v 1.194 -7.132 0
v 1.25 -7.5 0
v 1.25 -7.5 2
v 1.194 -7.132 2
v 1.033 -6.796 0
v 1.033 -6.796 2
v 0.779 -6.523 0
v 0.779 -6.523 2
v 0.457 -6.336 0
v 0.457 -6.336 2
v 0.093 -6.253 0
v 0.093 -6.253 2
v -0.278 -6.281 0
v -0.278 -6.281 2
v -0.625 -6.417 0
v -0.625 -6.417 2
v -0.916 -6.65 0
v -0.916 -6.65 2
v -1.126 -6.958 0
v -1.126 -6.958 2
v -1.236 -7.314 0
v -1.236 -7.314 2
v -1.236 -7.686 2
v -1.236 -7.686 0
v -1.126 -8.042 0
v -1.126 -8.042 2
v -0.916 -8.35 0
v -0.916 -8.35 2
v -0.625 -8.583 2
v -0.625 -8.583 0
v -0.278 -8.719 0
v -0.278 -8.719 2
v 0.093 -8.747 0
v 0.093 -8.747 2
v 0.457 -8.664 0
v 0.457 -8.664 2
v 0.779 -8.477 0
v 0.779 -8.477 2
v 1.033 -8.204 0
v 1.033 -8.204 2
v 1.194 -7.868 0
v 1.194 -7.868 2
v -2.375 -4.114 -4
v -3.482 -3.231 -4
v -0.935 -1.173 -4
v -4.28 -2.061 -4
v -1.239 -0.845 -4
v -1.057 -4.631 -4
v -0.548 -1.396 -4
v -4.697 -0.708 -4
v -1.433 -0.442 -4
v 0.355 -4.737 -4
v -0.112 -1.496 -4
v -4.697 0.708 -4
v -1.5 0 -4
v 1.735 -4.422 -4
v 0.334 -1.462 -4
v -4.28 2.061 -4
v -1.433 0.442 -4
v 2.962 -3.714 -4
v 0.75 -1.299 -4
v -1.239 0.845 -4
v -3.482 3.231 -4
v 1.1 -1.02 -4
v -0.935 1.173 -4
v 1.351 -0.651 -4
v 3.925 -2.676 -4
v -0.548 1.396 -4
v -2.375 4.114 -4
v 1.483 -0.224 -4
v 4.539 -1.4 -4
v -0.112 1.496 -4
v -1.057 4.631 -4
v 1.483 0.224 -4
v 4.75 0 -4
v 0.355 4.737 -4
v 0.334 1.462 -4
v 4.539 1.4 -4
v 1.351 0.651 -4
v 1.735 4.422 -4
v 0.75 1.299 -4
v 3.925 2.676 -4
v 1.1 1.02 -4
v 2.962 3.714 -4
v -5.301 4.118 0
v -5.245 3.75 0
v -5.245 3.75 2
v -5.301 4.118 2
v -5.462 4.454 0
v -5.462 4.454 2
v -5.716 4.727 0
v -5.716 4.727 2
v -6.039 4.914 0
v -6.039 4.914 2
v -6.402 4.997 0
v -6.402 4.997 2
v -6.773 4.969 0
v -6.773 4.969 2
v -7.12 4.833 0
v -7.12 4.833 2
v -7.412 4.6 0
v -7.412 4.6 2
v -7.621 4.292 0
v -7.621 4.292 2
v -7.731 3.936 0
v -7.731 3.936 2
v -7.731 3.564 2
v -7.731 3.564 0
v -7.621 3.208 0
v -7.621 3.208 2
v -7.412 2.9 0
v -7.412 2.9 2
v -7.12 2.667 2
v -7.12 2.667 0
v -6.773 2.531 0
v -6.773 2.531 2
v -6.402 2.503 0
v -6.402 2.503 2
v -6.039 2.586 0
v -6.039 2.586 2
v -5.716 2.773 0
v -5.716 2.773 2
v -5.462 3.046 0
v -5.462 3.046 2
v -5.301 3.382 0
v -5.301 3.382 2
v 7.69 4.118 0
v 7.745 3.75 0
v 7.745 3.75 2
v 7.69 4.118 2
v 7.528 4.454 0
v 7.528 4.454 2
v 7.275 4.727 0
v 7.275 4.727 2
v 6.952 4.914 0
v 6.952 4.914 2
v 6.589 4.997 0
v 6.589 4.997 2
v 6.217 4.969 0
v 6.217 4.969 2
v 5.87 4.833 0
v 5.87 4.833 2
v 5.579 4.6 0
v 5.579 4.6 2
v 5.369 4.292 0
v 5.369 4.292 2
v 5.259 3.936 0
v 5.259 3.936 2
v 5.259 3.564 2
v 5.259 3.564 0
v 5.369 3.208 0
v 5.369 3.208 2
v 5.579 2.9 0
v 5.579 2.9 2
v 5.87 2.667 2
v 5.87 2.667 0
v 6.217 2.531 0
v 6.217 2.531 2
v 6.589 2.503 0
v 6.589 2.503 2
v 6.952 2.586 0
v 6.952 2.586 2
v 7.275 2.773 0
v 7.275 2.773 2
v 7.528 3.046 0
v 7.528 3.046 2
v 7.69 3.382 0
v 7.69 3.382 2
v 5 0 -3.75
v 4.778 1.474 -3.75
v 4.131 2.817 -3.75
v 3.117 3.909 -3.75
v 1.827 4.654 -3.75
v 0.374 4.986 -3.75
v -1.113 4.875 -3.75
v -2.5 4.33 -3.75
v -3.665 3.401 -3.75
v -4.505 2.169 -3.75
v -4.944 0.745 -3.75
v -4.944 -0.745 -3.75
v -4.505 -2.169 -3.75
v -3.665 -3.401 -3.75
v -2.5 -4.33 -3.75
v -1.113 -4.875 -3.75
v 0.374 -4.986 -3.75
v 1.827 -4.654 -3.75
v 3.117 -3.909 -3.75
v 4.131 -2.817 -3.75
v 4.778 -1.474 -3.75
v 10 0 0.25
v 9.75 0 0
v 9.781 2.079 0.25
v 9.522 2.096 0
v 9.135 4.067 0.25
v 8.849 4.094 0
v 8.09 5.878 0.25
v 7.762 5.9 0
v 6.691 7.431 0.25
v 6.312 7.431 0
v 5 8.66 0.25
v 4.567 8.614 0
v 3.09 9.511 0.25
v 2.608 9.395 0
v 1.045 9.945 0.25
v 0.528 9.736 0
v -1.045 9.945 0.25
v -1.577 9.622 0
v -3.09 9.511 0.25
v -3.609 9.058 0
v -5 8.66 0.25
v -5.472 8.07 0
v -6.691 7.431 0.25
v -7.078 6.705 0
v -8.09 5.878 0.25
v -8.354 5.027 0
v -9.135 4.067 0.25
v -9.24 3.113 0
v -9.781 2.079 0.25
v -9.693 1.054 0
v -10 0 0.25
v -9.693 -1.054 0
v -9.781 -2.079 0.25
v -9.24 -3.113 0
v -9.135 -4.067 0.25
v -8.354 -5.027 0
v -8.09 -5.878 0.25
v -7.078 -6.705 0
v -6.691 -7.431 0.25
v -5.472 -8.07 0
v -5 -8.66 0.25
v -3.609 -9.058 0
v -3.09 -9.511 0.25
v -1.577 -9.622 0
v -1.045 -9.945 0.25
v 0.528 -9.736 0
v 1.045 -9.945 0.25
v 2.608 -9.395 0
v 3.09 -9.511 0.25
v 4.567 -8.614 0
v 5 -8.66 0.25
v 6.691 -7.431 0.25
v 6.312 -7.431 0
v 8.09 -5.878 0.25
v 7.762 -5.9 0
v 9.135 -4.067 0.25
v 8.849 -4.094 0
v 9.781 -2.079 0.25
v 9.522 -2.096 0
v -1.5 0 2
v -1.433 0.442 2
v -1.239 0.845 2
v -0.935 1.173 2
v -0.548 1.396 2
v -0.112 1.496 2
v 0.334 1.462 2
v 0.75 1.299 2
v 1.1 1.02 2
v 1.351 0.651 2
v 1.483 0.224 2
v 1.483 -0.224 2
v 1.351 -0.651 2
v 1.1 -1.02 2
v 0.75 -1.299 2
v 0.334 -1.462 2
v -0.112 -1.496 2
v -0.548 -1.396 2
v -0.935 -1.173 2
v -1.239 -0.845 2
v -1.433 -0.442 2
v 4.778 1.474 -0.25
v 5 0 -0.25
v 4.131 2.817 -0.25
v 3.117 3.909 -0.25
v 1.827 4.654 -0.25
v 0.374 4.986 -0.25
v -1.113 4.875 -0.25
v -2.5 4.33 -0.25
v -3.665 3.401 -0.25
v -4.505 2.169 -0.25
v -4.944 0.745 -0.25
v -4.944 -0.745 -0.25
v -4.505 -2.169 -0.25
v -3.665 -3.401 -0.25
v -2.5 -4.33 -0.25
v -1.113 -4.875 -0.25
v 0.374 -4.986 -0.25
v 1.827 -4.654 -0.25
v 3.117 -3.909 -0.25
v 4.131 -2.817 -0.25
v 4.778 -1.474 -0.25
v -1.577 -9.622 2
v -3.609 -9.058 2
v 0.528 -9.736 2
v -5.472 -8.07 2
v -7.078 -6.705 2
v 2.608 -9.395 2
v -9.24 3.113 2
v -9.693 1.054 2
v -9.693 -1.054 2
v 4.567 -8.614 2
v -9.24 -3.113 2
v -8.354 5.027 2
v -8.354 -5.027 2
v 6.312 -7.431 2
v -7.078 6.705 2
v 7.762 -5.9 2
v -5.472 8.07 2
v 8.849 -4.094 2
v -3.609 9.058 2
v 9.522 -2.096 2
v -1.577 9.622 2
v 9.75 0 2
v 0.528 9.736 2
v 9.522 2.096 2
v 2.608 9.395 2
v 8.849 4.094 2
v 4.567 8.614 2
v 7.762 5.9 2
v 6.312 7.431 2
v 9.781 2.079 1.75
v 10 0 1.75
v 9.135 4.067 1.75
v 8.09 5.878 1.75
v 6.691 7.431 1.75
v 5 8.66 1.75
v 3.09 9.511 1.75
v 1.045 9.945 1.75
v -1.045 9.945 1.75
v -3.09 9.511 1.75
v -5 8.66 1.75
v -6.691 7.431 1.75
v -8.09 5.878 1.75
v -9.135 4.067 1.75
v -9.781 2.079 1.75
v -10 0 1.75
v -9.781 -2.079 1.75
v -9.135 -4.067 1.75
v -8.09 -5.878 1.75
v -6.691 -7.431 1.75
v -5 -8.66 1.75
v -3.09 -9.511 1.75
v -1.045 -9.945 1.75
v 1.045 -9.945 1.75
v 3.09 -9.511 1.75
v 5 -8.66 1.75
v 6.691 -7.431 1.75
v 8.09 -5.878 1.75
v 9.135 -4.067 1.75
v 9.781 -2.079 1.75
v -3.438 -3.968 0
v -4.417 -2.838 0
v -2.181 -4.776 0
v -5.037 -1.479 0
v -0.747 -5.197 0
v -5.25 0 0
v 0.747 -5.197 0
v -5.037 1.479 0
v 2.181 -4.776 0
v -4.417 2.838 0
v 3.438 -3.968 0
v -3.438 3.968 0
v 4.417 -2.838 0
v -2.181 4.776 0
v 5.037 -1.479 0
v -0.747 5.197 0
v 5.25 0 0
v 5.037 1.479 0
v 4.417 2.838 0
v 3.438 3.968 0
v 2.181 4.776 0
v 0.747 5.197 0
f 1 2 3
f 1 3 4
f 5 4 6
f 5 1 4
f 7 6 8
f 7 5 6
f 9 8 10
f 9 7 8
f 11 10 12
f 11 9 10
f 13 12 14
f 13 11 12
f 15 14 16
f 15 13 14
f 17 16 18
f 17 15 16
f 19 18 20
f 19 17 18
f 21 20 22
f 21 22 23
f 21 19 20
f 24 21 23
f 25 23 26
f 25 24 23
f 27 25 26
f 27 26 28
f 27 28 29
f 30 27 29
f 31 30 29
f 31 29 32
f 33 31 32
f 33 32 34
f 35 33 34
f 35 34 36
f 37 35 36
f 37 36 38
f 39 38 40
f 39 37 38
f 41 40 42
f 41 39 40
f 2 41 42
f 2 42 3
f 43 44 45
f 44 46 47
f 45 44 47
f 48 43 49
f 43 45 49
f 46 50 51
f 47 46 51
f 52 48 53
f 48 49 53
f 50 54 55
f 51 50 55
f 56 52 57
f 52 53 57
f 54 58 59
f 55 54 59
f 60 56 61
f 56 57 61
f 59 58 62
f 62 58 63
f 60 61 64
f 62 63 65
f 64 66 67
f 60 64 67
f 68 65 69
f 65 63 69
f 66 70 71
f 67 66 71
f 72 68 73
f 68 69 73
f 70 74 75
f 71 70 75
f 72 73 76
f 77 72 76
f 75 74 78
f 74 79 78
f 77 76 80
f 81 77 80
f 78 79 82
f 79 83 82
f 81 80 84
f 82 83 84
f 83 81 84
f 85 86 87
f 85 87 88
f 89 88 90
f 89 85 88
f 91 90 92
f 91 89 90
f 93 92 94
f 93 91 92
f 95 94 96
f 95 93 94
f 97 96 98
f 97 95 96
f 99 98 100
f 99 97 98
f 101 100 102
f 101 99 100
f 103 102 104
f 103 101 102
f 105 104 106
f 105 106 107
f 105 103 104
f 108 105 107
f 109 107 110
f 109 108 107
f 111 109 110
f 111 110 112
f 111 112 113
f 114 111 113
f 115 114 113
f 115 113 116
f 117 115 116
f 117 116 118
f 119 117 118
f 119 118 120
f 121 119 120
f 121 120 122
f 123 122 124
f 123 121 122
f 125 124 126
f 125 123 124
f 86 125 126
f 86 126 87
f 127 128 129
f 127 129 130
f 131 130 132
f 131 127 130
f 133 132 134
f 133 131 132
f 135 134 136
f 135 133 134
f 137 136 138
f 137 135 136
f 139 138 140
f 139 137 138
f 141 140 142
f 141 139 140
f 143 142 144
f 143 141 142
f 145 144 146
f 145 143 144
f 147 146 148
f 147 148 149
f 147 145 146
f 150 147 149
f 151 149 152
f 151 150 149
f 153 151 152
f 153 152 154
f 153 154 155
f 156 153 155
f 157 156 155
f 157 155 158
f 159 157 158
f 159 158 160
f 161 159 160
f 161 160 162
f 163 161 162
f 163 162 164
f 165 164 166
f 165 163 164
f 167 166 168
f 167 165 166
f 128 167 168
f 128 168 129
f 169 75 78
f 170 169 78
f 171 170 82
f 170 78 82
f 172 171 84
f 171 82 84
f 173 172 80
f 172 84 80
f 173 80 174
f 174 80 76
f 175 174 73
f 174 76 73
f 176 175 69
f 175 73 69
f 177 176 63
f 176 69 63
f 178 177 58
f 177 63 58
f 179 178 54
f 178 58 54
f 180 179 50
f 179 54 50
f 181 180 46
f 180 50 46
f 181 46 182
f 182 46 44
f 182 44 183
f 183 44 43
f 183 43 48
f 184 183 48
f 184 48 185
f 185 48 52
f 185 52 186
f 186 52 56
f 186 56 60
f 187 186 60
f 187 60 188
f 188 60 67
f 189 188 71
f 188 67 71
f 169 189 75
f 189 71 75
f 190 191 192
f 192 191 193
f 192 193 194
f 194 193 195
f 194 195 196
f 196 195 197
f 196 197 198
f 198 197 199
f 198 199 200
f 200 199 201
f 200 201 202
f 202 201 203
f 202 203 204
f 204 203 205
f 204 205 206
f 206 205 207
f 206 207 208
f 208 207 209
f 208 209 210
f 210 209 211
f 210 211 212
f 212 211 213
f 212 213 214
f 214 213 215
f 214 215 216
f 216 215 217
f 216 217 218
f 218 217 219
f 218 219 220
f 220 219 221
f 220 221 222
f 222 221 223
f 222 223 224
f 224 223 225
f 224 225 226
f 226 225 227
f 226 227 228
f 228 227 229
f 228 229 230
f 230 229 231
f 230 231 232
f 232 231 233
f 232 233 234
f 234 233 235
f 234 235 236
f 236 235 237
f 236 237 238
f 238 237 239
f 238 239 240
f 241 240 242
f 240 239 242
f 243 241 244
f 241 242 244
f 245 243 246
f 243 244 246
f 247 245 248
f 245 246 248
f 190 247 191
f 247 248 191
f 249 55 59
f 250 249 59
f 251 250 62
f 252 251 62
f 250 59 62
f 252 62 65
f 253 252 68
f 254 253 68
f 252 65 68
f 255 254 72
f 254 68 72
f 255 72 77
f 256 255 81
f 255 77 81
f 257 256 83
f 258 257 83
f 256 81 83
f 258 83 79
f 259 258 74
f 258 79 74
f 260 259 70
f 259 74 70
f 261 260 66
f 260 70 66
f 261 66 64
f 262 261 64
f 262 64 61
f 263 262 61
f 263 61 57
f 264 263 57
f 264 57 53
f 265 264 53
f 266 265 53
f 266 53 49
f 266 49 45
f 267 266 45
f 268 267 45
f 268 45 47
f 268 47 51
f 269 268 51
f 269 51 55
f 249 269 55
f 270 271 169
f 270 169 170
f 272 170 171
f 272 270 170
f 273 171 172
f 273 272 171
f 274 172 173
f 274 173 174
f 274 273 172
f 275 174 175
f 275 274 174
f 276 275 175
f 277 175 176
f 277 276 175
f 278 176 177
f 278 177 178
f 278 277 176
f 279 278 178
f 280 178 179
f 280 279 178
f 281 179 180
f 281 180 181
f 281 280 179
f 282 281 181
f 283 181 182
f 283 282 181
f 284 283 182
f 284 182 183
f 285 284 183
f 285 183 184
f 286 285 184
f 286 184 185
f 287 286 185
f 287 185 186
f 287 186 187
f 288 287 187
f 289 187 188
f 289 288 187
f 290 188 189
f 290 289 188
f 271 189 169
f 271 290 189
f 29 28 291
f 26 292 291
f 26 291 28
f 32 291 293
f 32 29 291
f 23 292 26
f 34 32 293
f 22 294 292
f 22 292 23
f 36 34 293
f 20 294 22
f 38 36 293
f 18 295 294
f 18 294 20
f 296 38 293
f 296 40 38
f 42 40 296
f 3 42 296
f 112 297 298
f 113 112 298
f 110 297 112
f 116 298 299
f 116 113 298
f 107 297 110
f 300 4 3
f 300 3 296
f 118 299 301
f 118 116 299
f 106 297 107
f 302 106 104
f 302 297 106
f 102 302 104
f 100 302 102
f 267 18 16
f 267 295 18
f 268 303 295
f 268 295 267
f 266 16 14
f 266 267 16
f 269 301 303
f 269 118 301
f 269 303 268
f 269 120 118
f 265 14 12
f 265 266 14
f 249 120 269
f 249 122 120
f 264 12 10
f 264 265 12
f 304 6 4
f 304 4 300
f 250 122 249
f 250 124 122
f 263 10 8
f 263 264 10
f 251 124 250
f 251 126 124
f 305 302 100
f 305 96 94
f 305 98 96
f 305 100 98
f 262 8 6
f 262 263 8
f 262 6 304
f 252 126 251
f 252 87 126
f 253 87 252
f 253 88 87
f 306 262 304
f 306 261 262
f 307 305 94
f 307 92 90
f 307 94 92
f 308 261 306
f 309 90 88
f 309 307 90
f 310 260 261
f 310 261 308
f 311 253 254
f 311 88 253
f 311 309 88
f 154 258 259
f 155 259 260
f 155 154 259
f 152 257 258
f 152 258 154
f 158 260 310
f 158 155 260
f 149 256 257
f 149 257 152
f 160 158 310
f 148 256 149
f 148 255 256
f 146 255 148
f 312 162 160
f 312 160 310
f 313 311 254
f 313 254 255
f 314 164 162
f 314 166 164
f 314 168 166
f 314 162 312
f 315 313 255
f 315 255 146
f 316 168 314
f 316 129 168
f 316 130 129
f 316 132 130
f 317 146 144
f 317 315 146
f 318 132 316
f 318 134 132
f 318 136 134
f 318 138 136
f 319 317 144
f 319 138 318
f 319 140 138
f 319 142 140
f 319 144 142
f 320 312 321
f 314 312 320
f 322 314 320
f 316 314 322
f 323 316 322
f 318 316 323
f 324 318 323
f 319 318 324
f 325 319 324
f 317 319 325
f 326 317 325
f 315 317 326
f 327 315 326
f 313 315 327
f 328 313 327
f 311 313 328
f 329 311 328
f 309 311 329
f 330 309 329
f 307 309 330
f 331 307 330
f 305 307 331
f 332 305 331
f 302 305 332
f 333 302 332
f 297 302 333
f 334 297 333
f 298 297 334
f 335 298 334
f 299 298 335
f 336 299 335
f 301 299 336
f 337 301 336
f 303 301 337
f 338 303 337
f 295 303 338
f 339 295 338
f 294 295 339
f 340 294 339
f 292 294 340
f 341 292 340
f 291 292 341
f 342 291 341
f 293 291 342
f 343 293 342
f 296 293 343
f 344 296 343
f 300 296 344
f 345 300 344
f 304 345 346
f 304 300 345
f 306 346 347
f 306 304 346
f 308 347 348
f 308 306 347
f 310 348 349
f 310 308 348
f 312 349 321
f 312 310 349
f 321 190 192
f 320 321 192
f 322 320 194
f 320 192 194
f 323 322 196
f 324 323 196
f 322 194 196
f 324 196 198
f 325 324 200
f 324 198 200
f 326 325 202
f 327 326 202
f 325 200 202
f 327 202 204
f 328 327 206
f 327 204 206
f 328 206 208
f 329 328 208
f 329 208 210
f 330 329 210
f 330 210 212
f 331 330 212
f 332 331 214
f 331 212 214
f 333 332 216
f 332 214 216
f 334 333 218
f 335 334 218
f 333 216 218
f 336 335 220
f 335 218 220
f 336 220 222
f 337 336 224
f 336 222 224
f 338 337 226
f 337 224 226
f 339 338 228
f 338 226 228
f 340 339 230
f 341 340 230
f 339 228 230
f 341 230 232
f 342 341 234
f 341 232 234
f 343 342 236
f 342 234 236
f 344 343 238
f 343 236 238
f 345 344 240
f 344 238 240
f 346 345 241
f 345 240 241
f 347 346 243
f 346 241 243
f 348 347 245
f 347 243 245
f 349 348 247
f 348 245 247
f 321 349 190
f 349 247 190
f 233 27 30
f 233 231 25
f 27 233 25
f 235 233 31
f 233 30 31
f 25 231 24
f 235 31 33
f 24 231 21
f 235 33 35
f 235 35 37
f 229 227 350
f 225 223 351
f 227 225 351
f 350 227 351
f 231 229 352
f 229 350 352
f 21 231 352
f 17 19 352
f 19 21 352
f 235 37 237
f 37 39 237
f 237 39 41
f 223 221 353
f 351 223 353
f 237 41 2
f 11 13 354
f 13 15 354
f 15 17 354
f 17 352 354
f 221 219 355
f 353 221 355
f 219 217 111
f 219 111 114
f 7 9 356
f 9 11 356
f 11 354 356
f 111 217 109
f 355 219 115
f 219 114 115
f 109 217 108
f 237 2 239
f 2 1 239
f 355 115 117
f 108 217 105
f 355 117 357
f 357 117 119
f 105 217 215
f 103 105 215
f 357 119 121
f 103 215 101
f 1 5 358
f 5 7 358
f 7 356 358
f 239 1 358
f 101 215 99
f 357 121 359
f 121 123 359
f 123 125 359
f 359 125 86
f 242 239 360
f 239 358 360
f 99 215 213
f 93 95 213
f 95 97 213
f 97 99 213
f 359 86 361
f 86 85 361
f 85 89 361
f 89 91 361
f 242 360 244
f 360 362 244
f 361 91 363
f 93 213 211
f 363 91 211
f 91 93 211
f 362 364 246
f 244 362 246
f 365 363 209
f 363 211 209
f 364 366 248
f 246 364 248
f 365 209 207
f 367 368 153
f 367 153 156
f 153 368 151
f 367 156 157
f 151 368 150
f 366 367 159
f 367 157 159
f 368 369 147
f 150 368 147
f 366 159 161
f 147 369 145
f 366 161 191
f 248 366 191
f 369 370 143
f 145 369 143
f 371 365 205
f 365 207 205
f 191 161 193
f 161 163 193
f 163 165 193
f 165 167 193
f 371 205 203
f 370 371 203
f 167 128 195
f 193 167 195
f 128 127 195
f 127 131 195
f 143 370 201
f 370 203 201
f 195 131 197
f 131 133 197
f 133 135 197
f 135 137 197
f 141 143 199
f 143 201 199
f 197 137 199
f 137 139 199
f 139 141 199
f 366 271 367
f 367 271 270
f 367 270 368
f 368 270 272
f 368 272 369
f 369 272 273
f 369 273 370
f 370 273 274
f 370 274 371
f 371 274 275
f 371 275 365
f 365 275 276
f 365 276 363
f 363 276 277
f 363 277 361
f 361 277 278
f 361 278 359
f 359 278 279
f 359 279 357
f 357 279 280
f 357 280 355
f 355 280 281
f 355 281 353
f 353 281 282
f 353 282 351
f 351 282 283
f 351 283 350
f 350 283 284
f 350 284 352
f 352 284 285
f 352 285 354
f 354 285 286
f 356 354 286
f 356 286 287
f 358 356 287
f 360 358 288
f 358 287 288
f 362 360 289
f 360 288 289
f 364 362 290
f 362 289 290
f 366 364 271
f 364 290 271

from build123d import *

# Parameters (mm, degrees)
SKETCH1_R           = 5
BOSS_EXTRUDE1_DEPTH = 4
SKETCH2_R           = 10
SKETCH2_R_2         = 1.25
BOSS_EXTRUDE2_DEPTH = 2
SKETCH3_R           = 1.5
CUT_EXTRUDE1_DEPTH  = 16.362291496
CHAMFER1_SIZE       = 0.25


with BuildPart() as part:
    # Sketch1 → Boss-Extrude1 (new body)
    with BuildSketch(Plane.XY):
        Circle(SKETCH1_R)
    extrude(amount=-BOSS_EXTRUDE1_DEPTH)

    # Sketch2 → Boss-Extrude2 (add)
    with BuildSketch(Plane.XY):
        Circle(SKETCH2_R)
        with Locations((-6.495190528, 3.75)):
            Circle(SKETCH2_R_2, mode=Mode.SUBTRACT)
        with Locations((6.495190528, 3.75)):
            Circle(SKETCH2_R_2, mode=Mode.SUBTRACT)
        with Locations((0, -7.5)):
            Circle(SKETCH2_R_2, mode=Mode.SUBTRACT)
    extrude(amount=BOSS_EXTRUDE2_DEPTH)

    # Sketch3 → Cut-Extrude1 (cut, through all)
    with BuildSketch(Plane(origin=(0, 0, -4), x_dir=(-1, 0, 0), z_dir=(0, 0, -1))):
        Circle(SKETCH3_R)
    extrude(amount=-CUT_EXTRUDE1_DEPTH, mode=Mode.SUBTRACT)

    # Chamfer1
    chamfer1_edges = [part.edges().sort_by_distance(p)[0] for p in [
        (-5, 0, 0),
        (-5, 0, -4),
        (-10, 0, 2),
        (-10, 0, 0),
    ]]
    chamfer(chamfer1_edges, length=CHAMFER1_SIZE)


solid = part.part
